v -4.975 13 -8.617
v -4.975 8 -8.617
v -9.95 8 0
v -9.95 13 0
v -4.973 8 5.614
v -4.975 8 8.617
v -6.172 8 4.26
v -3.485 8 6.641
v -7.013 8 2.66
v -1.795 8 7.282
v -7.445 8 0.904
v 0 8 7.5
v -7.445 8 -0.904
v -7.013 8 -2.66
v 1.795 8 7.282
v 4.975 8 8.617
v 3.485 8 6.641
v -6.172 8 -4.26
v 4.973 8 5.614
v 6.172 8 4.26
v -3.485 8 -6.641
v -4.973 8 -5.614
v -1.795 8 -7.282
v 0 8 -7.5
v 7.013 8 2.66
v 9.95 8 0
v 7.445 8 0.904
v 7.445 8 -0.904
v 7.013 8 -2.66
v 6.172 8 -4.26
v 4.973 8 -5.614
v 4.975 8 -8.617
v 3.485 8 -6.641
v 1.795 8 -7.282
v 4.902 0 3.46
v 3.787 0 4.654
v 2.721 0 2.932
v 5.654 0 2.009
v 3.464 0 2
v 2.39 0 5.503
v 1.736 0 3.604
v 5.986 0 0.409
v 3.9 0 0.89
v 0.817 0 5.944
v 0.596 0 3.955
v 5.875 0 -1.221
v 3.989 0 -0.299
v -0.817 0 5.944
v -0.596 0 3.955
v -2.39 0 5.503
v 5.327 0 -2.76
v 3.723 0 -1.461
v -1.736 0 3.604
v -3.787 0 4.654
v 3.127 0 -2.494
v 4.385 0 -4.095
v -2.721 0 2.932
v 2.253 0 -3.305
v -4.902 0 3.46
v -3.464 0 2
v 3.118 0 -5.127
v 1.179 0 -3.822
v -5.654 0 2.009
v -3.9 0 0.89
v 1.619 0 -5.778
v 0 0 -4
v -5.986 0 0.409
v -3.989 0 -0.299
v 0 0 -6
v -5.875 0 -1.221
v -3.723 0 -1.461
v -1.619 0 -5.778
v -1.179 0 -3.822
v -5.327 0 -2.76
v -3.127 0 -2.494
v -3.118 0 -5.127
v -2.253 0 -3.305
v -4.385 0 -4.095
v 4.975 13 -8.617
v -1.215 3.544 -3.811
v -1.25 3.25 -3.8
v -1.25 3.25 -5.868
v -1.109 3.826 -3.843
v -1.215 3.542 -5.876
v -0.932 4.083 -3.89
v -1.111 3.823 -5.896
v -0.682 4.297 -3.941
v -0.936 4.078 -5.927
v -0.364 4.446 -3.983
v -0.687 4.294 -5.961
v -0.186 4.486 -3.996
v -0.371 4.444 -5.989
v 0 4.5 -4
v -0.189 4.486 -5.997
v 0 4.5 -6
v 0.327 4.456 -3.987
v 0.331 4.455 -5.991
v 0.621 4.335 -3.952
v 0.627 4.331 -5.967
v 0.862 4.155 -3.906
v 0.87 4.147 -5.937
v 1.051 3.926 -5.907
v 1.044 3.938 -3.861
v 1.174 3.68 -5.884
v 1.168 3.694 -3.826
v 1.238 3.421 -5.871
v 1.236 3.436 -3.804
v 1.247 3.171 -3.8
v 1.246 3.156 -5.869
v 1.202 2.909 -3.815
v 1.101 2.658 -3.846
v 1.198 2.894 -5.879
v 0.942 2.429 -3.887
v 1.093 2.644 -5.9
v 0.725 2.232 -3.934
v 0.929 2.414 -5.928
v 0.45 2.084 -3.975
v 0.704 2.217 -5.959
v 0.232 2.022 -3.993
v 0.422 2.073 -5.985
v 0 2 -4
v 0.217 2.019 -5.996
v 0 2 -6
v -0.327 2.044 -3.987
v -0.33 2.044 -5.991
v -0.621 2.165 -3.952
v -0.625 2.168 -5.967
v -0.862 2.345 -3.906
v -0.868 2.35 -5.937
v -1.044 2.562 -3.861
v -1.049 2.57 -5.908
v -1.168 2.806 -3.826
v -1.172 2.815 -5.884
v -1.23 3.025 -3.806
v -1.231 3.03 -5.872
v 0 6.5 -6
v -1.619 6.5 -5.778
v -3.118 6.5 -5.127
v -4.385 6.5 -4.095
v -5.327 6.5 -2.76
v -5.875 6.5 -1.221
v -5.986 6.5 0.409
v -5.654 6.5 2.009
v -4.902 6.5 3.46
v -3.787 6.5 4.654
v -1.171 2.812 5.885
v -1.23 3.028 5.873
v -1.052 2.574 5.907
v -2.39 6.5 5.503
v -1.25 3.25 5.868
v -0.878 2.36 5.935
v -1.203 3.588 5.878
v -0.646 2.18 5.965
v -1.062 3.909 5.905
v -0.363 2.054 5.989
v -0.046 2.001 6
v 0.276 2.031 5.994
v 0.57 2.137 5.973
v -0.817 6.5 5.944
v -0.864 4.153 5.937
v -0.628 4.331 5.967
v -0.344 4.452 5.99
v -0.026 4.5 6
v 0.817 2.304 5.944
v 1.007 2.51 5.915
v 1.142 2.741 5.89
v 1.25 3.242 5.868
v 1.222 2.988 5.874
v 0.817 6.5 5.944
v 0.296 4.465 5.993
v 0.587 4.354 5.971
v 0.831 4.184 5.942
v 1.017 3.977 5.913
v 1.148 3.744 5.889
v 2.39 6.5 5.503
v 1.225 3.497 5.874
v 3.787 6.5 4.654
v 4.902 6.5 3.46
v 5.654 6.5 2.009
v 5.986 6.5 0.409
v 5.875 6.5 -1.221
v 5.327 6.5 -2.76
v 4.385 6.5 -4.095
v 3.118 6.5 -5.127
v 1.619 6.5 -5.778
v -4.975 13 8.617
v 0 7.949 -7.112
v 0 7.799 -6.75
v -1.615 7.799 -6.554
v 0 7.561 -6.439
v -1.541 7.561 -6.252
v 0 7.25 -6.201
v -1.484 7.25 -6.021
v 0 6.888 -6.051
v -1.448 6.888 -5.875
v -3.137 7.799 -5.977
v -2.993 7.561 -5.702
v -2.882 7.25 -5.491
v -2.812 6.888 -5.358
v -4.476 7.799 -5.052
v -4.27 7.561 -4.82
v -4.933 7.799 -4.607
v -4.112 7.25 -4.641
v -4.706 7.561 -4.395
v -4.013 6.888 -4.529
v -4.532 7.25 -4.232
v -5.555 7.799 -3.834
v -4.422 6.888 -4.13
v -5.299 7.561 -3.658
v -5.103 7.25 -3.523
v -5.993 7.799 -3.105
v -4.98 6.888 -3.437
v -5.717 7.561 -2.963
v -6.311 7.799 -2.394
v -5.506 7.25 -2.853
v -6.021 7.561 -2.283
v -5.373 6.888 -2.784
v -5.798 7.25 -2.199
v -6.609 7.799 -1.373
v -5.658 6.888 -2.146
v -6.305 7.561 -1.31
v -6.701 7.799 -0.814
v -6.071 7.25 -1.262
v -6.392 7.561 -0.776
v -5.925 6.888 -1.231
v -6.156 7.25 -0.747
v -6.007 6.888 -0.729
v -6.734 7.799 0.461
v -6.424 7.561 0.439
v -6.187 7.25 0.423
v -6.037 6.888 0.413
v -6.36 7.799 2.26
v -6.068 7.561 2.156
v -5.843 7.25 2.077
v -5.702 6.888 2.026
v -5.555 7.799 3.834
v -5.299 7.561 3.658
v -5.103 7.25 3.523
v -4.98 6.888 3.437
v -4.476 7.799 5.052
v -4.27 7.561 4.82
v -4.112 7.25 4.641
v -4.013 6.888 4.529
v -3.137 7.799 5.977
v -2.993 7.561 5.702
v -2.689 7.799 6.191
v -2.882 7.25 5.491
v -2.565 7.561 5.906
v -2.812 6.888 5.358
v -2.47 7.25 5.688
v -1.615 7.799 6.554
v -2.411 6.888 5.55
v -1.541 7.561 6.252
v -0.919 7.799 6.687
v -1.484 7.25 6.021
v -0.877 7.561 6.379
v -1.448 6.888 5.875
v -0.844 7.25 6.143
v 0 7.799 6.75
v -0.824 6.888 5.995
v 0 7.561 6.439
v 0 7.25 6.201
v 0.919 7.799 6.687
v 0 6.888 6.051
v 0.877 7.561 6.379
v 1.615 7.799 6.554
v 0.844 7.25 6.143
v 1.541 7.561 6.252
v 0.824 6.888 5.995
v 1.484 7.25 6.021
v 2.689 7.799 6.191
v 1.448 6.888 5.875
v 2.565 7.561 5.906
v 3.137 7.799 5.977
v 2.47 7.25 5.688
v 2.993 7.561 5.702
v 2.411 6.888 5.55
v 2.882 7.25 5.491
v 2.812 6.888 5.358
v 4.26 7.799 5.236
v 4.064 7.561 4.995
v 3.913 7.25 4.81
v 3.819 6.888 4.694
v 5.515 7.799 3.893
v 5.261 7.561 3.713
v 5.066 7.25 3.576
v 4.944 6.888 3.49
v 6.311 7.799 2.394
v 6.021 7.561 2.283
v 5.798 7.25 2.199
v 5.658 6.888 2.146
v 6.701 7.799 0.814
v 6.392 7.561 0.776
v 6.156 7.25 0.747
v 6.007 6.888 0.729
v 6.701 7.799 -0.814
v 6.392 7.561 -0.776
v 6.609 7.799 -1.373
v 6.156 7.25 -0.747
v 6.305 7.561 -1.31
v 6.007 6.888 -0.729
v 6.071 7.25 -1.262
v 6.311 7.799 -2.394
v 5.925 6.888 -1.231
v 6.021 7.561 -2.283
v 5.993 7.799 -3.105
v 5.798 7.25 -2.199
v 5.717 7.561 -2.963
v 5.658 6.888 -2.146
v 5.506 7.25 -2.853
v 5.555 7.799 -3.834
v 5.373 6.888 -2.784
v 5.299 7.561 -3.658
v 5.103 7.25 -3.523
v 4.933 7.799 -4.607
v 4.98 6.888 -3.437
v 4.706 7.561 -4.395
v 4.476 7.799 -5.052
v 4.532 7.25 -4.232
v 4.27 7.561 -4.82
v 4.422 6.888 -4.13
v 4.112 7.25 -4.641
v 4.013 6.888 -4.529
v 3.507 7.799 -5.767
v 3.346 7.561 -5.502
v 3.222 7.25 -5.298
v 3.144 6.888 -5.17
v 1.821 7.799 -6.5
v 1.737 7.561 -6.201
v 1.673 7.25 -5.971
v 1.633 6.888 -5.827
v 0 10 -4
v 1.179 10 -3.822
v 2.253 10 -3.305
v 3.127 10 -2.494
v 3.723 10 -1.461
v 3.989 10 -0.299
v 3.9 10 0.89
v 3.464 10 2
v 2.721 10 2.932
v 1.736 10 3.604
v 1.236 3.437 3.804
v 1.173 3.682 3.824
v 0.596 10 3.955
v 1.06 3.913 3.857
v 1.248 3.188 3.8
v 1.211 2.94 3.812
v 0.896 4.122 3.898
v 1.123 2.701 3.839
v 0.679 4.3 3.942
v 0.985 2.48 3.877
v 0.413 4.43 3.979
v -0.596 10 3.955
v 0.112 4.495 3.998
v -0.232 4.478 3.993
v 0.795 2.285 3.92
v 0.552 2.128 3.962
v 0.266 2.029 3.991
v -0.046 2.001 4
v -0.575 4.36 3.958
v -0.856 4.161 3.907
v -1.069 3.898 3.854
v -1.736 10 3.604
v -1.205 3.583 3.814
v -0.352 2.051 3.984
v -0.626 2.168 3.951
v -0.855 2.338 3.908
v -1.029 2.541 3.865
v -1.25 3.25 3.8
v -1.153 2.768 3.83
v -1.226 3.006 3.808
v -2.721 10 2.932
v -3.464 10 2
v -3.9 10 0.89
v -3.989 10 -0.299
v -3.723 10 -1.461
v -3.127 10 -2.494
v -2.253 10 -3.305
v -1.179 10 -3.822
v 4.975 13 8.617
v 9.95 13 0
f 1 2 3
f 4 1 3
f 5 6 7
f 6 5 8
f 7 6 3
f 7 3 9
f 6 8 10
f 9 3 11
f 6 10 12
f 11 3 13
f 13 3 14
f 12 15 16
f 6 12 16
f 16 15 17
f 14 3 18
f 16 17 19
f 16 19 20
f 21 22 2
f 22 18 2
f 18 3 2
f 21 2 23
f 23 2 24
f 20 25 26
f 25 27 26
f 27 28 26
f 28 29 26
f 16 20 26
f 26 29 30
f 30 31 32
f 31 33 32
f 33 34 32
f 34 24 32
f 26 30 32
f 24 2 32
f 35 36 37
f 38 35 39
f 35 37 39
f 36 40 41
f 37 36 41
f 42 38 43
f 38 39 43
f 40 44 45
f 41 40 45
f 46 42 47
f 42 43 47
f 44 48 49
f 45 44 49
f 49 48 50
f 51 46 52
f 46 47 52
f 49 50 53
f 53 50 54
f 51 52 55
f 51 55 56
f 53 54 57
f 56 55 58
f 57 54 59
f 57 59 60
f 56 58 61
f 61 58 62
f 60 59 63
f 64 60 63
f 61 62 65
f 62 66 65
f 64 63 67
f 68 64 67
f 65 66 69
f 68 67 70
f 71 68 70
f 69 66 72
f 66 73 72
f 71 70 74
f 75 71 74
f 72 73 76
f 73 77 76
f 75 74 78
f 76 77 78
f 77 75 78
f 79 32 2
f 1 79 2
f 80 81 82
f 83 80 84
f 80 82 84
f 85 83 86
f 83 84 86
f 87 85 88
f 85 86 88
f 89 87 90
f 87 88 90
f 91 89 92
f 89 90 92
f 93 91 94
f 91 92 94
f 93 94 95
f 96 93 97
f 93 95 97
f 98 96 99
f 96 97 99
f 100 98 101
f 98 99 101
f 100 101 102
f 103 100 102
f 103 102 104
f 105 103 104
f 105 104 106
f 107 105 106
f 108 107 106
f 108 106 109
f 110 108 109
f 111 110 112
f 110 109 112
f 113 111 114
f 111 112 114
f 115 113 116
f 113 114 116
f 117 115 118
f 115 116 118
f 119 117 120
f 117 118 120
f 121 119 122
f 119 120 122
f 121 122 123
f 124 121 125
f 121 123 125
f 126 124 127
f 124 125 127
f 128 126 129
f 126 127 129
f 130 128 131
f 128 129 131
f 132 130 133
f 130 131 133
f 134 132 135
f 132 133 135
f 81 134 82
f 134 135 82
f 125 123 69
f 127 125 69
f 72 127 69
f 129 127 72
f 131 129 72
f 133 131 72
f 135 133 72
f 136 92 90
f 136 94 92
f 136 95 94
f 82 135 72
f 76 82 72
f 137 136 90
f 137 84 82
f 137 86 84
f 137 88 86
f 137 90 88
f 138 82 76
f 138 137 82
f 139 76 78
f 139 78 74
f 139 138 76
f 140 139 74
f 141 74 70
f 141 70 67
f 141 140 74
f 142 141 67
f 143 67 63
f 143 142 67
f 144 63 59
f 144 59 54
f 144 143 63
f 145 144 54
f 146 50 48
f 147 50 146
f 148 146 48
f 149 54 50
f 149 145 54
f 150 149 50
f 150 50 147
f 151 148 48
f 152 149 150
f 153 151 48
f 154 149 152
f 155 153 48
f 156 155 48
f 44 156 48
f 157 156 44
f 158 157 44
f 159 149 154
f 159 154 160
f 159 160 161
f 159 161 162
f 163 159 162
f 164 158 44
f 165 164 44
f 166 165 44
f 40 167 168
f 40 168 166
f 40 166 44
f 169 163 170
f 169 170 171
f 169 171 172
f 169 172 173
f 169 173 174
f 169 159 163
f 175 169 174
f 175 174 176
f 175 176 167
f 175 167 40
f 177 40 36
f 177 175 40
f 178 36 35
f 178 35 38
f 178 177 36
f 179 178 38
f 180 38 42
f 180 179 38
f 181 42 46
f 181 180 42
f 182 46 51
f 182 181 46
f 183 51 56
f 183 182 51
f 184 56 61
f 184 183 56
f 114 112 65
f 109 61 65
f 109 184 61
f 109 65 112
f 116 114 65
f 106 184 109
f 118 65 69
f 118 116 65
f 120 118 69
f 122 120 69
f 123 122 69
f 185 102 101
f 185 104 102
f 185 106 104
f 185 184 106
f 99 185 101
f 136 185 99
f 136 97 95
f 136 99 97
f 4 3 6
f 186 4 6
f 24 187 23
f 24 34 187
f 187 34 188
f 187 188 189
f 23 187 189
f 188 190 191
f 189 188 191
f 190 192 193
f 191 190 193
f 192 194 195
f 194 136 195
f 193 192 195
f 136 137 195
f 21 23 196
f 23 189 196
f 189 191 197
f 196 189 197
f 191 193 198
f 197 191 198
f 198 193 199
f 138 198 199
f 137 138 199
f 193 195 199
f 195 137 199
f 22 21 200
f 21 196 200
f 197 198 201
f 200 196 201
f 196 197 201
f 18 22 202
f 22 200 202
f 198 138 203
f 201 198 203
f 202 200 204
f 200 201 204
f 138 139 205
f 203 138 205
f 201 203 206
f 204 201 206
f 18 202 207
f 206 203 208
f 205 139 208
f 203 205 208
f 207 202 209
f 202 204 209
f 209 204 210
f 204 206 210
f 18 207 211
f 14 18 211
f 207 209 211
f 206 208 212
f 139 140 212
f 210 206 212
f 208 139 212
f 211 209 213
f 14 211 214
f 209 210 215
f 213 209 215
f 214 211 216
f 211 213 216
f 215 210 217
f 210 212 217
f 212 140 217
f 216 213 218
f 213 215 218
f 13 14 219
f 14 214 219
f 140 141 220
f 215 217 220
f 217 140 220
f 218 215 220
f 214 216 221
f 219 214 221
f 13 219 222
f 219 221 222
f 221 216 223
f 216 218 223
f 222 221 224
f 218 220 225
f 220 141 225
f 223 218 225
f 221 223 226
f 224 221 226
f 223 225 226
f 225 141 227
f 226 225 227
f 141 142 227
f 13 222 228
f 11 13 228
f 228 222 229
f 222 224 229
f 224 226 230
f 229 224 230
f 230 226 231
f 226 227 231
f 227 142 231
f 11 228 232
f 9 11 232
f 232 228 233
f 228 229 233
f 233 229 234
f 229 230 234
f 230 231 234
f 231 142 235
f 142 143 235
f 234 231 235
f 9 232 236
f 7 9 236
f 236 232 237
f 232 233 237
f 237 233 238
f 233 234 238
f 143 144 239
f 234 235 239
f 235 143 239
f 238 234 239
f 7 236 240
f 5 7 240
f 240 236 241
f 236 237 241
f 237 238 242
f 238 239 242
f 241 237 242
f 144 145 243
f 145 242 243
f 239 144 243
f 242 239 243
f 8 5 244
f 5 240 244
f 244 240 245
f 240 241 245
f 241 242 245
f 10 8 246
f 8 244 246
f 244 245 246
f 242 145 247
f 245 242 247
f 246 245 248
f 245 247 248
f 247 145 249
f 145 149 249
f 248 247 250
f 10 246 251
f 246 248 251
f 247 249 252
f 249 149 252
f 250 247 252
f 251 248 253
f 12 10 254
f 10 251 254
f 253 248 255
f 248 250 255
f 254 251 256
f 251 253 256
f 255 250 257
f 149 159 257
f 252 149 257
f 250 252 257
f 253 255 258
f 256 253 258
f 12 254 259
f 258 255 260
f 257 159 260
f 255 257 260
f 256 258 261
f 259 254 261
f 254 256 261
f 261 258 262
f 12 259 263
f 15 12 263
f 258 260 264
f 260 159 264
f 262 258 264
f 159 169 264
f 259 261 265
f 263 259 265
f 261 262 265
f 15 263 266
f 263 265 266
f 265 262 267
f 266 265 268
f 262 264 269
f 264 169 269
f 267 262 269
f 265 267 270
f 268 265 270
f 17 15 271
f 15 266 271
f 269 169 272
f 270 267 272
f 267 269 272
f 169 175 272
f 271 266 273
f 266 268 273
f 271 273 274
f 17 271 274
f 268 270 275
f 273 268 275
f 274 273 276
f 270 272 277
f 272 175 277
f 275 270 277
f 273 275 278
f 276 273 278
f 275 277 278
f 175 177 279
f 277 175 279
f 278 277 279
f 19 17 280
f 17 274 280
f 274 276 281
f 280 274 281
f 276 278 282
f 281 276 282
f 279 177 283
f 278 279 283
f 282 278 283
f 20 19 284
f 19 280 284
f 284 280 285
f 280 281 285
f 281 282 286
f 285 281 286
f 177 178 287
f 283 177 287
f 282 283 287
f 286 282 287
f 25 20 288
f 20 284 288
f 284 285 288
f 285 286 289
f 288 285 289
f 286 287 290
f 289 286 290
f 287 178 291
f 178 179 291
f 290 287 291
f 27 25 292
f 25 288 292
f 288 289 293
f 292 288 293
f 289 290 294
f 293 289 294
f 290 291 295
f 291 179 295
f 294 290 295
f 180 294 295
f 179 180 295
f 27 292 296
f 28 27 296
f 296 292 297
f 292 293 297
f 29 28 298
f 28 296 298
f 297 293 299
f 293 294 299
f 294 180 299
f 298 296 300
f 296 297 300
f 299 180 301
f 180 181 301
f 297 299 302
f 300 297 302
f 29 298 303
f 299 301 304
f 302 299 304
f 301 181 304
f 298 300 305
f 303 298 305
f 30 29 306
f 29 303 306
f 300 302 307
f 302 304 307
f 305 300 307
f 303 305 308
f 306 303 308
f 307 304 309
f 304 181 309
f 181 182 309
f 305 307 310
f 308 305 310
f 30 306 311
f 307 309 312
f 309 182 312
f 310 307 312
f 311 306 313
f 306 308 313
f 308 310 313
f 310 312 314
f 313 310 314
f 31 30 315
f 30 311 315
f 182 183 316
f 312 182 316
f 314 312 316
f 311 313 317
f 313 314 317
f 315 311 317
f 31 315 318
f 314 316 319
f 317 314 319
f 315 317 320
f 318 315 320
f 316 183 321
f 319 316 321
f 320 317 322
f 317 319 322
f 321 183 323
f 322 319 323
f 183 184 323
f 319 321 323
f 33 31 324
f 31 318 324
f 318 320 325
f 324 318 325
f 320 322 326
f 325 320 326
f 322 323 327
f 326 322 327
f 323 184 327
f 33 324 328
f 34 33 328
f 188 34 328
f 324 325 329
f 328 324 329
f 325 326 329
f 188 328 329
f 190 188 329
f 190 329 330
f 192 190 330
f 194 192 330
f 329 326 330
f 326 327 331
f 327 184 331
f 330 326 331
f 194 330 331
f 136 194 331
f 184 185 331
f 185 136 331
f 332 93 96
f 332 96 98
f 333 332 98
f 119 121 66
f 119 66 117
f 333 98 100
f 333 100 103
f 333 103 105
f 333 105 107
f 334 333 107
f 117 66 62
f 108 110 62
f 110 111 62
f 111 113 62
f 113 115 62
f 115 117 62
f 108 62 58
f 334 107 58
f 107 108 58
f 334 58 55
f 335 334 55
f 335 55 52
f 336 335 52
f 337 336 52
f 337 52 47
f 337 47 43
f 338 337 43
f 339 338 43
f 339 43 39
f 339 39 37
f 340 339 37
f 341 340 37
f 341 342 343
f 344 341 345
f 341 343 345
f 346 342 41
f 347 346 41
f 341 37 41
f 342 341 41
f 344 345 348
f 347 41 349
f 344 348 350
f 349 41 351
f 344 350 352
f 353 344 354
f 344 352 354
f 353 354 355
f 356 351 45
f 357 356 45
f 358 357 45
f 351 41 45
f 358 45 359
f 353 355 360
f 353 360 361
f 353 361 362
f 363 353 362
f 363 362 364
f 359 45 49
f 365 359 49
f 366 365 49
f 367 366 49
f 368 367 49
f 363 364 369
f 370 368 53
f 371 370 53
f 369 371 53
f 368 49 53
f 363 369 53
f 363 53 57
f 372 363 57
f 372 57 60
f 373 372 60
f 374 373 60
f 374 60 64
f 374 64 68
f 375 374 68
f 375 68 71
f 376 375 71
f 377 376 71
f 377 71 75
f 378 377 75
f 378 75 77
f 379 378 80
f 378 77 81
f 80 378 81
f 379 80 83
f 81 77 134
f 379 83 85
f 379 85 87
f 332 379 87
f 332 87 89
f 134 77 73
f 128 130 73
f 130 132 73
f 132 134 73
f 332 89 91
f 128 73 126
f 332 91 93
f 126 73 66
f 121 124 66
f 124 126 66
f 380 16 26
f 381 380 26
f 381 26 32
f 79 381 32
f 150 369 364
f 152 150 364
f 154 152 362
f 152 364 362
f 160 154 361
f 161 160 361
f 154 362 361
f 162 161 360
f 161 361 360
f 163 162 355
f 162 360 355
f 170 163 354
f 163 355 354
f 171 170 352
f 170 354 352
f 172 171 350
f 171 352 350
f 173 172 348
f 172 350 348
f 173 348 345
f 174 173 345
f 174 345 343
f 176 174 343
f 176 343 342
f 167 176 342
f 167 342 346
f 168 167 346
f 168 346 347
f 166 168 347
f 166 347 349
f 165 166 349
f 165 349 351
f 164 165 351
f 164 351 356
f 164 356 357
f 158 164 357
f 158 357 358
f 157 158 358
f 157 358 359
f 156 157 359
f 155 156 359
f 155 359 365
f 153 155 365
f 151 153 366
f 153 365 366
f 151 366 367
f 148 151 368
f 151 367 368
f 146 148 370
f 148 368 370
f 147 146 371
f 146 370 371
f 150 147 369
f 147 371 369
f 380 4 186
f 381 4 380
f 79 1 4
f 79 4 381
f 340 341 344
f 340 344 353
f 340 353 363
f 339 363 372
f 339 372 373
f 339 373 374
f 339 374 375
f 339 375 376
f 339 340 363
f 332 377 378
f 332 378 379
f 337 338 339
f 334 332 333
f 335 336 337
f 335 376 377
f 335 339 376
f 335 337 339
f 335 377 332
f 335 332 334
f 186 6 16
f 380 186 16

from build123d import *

# Parameters (mm, degrees)
CROQUIS1_W                  = 6
CROQUIS1_H                  = 8
SALIENTE_EXTRUIR1_DEPTH     = 5
REDONDEO4_R                 = 1.5
SKETCH6_R                   = 4
CUT_EXTRUDE1_DEPTH          = 10
TAP_DRILL_FOR_M3X0_5_TAP1_D = 2.5


with BuildPart() as part:
    # Croquis1 → Revolución1 (revolve)
    with BuildSketch(Plane(origin=(0, 0, 0), x_dir=(0, 0, -1), z_dir=(1, 0, 0)), mode=Mode.PRIVATE) as revoluci_n1_sk:
        with Locations((-3, 4)):
            Rectangle(CROQUIS1_W, CROQUIS1_H)
    revolve(revoluci_n1_sk.sketch.rotate(Axis((0, 0, 0), (0, 1, 0)), 180), axis=Axis((0, 0, 0), (0, 1, 0)))

    # Croquis2 → Saliente-Extruir1 (add)
    with BuildSketch(Plane(origin=(0, 8, 0), x_dir=(1, 0, 0), z_dir=(0, 1, 0))):
        Polygon((-9.95, 0), (-4.975, -8.616952768), (4.975, -8.616952768), (9.95, 0), (4.975, 8.616952768), (-4.975, 8.616952768), align=None)
    extrude(amount=SALIENTE_EXTRUIR1_DEPTH)

    # Redondeo4
    redondeo4_edges = [part.edges().sort_by_distance(p)[0] for p in [
        (0, 8, 6),
    ]]
    fillet(redondeo4_edges, radius=REDONDEO4_R)

    # Sketch6 → Cut-Extrude1 (cut)
    with BuildSketch(Plane.XZ):
        with Locations(Location((0, 0, 0), (0, 0, 270))):
            Circle(SKETCH6_R)
    extrude(amount=-CUT_EXTRUDE1_DEPTH, mode=Mode.SUBTRACT)

    # Tap Drill for M3x0.5 Tap1 (through all)
    with Locations(Plane(origin=(0, 3.25, 6), x_dir=(1, 0, 0), z_dir=(0, 0, 1))):
        with Locations((0, 0)):
            Hole(TAP_DRILL_FOR_M3X0_5_TAP1_D / 2)


solid = part.part
